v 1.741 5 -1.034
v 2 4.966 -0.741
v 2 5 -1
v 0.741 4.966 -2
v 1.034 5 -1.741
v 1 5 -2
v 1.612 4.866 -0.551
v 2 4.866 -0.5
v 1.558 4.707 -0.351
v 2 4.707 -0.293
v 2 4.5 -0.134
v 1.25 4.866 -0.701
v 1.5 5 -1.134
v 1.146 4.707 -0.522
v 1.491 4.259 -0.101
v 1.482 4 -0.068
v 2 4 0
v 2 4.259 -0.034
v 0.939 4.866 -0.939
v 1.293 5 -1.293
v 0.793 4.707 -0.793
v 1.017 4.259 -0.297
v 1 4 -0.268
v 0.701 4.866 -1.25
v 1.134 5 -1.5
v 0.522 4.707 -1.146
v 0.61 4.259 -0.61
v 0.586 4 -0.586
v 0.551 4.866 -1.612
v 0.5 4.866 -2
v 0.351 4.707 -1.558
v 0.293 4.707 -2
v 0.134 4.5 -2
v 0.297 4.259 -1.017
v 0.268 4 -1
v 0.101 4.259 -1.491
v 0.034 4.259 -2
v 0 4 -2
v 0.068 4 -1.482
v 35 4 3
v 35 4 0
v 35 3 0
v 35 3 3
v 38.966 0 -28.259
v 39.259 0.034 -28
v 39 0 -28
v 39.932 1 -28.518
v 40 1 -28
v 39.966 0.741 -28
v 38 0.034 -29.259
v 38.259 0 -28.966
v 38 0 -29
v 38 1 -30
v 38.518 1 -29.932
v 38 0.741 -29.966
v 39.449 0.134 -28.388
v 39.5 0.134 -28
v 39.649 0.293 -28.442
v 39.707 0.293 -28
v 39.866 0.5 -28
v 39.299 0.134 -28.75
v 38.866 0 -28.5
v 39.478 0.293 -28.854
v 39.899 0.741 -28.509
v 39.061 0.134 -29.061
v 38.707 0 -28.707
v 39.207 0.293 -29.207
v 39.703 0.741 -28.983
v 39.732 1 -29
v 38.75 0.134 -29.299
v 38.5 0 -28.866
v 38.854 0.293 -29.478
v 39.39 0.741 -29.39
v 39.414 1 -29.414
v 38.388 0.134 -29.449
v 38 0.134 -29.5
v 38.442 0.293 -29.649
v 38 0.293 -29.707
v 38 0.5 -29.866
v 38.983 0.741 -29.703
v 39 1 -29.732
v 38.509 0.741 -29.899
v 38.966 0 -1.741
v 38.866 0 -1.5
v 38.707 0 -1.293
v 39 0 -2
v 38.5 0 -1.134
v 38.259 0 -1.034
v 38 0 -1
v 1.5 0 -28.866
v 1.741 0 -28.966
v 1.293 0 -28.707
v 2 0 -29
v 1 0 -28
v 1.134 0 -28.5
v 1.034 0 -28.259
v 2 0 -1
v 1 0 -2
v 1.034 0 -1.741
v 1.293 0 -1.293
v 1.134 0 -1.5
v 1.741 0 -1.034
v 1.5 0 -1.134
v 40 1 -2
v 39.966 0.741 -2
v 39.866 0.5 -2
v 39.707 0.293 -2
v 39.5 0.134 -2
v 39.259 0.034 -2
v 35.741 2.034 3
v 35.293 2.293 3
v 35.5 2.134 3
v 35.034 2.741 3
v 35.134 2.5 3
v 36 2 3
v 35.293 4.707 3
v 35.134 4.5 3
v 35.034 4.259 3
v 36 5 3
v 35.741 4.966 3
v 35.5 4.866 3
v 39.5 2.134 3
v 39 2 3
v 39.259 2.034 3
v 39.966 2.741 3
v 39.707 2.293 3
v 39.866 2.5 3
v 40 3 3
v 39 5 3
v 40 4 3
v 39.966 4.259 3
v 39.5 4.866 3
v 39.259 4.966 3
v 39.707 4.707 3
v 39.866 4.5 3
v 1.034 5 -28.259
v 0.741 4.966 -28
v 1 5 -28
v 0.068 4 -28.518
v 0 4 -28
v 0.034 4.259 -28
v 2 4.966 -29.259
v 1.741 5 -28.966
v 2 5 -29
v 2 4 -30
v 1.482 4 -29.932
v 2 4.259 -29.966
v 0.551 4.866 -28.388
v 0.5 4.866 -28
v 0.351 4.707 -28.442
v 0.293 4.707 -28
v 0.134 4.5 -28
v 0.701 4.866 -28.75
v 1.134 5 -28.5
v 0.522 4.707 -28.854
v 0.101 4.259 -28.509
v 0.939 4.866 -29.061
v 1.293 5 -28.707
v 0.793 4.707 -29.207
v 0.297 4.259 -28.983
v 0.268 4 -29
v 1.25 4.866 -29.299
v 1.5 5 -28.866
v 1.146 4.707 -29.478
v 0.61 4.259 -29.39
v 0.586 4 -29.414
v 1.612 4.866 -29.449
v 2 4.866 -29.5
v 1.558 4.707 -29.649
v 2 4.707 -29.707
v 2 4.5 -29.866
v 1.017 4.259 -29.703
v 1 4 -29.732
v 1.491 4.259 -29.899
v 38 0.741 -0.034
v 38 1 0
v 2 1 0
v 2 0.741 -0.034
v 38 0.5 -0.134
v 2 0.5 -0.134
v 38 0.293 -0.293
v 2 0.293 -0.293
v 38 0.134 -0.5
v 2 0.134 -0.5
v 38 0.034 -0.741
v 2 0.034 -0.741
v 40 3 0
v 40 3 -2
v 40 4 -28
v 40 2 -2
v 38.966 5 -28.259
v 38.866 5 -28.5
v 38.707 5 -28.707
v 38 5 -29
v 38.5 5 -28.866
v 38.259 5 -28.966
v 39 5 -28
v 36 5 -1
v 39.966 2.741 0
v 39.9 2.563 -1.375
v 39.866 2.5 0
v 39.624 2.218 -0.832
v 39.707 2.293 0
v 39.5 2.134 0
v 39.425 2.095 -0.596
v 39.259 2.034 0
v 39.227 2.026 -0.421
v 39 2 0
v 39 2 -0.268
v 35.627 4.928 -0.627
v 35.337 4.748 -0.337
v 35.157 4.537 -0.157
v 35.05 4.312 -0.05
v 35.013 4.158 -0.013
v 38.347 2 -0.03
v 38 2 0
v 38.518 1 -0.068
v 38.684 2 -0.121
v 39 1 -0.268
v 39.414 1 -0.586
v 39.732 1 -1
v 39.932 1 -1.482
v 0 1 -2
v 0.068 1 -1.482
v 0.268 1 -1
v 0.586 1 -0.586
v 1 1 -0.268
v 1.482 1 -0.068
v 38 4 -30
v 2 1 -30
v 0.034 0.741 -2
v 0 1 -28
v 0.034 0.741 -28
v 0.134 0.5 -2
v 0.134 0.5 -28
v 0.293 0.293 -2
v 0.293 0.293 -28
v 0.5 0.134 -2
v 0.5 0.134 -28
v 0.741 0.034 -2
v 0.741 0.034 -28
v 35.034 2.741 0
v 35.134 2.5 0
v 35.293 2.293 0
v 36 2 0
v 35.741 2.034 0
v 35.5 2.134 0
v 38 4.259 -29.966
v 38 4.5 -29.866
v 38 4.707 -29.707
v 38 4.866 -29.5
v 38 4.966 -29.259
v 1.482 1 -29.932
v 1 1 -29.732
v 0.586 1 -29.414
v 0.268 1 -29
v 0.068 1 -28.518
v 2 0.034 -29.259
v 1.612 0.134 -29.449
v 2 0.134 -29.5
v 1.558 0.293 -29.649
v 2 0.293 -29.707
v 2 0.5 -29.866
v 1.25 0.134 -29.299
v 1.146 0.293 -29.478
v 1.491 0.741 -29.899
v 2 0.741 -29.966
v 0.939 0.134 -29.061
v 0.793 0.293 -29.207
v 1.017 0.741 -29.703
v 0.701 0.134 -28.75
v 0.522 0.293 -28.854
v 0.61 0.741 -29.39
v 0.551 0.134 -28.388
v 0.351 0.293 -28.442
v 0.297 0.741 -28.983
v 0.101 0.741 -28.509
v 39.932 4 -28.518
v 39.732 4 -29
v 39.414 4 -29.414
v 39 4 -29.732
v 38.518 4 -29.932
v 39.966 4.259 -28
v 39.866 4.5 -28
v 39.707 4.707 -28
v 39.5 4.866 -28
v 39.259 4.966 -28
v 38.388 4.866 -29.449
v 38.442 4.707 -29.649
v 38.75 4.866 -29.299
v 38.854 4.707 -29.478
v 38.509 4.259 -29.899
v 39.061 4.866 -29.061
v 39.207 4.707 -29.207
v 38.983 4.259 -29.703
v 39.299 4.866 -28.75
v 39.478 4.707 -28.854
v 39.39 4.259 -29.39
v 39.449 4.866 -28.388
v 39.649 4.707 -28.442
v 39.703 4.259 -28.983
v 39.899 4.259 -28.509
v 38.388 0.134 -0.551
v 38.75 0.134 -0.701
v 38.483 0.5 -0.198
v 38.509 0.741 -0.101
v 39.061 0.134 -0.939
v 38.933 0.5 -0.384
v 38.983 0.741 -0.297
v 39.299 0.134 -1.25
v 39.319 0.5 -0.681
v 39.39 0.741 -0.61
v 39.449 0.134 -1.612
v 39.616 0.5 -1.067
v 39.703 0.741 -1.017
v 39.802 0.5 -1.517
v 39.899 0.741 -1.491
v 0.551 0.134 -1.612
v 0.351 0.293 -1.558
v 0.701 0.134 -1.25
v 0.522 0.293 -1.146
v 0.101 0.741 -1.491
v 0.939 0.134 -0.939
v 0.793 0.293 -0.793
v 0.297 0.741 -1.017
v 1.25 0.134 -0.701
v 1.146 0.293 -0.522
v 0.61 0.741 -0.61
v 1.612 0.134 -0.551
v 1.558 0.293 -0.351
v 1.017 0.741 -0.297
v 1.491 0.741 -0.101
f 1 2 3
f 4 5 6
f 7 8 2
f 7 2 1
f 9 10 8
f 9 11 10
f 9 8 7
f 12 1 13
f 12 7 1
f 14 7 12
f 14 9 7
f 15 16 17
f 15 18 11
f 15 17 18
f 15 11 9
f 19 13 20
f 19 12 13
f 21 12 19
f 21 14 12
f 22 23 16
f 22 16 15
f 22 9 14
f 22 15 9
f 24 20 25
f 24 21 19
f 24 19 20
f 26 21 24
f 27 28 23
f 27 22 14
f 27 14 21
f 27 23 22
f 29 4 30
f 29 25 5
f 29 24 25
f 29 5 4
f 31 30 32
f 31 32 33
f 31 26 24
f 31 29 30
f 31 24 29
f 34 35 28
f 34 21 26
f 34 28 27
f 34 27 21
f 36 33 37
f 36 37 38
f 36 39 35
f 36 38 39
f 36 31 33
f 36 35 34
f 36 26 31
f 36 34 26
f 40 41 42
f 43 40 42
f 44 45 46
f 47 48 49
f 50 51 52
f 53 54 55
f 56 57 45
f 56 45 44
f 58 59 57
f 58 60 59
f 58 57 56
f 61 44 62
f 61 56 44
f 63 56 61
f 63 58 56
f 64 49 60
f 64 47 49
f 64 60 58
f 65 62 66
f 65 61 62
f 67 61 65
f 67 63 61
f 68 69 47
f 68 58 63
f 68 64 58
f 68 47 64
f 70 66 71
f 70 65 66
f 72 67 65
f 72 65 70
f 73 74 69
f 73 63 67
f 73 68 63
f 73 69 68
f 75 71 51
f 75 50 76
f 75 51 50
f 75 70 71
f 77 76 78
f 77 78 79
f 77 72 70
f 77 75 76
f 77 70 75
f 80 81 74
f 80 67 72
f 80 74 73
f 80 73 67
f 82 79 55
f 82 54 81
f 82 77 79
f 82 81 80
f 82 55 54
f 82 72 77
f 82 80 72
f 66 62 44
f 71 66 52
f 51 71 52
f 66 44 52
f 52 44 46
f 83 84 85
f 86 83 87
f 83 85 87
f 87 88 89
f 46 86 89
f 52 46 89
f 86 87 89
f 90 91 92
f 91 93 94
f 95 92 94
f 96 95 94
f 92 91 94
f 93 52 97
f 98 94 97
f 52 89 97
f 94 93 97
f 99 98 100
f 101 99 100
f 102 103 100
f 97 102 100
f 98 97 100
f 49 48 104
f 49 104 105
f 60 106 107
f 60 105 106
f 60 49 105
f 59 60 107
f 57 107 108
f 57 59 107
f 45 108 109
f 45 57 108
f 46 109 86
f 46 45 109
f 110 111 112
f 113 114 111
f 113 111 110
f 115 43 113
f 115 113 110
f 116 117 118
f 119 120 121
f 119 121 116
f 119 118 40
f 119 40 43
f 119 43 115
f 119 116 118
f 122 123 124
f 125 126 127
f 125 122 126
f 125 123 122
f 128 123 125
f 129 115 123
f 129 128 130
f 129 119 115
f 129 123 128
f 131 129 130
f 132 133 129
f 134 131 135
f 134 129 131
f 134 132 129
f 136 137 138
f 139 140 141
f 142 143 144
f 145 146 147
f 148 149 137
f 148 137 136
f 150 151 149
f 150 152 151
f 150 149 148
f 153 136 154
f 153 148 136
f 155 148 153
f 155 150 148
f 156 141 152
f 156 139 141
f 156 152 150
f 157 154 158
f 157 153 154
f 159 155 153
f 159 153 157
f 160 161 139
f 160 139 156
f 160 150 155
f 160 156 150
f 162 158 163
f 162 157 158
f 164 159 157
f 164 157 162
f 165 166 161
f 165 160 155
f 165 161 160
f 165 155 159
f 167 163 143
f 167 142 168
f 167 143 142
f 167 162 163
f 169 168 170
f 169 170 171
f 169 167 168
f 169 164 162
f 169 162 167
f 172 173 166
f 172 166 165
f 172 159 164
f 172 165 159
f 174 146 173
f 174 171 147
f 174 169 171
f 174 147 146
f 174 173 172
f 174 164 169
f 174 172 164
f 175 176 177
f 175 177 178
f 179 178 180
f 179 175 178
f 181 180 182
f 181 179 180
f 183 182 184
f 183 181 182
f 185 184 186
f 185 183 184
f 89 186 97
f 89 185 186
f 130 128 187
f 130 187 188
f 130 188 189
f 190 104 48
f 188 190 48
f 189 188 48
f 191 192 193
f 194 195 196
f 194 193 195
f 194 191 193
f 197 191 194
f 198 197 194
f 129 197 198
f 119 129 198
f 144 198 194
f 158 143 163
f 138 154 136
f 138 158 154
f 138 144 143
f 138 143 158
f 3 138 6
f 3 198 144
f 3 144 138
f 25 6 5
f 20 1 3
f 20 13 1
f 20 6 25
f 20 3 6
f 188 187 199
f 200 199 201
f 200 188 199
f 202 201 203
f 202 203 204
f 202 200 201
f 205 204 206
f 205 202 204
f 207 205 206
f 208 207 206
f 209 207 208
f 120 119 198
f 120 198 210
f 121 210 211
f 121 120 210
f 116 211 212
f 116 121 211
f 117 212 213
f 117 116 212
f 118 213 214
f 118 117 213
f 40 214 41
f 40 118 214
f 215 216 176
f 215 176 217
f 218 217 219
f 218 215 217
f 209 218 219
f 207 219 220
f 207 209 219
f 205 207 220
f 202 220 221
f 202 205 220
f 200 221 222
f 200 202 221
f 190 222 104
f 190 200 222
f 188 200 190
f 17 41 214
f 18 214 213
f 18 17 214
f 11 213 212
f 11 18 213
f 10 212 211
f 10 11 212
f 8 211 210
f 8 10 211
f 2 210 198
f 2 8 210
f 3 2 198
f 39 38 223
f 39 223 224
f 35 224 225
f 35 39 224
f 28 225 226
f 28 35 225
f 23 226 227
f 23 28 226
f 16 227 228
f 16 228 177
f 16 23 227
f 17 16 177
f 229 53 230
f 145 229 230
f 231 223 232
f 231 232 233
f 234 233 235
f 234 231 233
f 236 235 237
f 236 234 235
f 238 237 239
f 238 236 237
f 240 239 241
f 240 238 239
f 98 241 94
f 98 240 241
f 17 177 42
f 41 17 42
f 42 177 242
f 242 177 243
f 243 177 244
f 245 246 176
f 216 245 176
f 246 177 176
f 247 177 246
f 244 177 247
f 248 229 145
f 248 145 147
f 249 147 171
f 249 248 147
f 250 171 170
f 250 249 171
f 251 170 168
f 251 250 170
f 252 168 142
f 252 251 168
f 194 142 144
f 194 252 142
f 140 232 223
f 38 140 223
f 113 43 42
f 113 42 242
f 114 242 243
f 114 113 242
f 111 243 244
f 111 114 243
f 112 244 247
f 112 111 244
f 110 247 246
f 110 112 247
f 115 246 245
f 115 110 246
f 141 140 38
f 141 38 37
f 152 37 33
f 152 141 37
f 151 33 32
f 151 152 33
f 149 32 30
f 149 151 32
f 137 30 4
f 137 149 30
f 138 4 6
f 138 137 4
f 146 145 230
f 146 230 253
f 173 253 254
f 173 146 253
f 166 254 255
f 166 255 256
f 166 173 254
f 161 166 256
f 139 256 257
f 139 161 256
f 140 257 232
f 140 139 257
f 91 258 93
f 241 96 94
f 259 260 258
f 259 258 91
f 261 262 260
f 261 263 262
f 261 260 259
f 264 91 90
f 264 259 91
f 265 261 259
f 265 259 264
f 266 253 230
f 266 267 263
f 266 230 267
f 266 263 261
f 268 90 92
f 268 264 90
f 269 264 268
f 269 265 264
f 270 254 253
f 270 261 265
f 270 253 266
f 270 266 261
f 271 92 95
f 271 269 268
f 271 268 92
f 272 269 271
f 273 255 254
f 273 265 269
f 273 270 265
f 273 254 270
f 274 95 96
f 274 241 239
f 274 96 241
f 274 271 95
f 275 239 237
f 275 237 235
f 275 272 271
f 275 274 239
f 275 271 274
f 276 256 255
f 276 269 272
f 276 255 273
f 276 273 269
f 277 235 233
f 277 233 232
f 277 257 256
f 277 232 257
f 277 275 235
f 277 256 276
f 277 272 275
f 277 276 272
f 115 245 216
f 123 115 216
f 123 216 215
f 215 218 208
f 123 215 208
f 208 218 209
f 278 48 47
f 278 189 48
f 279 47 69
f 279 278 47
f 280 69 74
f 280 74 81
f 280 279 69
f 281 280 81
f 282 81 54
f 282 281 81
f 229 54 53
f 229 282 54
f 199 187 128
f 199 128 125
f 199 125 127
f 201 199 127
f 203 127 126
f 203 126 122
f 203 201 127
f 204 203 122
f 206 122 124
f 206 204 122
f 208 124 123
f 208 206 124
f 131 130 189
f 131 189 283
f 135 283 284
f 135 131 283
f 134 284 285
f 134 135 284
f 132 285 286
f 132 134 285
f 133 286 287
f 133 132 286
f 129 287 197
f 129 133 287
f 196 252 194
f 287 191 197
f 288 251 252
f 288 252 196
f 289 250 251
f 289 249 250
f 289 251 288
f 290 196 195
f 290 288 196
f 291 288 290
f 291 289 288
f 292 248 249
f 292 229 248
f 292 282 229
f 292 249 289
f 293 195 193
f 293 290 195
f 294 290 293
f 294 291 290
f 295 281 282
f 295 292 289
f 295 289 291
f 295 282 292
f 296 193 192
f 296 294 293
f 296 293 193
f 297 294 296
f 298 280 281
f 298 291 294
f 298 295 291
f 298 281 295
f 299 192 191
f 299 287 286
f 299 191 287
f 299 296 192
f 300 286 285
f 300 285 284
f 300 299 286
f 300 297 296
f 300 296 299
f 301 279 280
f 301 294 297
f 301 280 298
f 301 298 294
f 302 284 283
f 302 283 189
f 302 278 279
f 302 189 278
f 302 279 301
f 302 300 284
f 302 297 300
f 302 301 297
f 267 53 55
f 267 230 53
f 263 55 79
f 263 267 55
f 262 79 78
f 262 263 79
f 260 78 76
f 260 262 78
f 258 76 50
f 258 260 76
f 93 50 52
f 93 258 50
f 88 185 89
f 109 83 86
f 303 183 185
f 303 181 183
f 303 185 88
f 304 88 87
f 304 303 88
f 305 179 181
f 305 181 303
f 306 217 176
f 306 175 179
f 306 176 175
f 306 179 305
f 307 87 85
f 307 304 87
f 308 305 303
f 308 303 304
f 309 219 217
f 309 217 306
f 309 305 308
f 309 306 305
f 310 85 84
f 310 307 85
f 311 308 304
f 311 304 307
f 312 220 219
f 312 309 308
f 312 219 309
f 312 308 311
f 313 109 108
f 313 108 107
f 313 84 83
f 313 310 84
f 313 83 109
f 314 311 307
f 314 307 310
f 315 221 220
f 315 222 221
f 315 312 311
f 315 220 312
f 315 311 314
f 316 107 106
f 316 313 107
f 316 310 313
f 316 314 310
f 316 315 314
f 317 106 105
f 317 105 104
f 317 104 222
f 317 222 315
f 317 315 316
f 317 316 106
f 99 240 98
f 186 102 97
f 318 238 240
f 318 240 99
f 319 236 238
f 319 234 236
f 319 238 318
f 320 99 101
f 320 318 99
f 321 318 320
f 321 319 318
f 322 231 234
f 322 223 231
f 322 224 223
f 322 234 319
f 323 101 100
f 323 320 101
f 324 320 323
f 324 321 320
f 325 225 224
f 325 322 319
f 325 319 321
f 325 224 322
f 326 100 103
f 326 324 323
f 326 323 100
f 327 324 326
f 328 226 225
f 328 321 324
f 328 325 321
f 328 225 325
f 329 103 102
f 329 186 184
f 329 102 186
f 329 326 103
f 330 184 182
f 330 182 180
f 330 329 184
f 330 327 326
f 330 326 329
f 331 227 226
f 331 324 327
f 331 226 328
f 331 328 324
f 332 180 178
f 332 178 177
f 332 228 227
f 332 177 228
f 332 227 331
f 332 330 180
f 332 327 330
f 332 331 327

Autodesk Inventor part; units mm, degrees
ref_plane "YZ Plane" through (0, 0, 0) normal (1, 0, 0) x (0, 1, 0)
ref_plane "XZ Plane" through (0, 0, 0) normal (0, 1, 0) x (-1, 0, 0)
ref_plane "XY Plane" through (0, 0, 0) normal (0, 0, 1) x (1, 0, 0)
sketch "Sketch1" plane through (0, 0, 0) normal (0, 1, 0) x (-1, 0, 0)
  line L0 (0, 0) -> (-40, 0)
  line L1 (-40, 0) -> (-40, -30)
  line L2 (-40, -30) -> (0, -30)
  line L3 (0, -30) -> (0, 0)
  dimension "d0" = 40
  dimension "d1" = 30
extrude "Extrusion1" add sketch "Sketch1" along normal blind 5
sketch "Sketch2" plane through (0, 0, 0) normal (0, 0, 1) x (1, 0, 0)
  line L0 (0, 0) -> (40, 0) construction
  line L1 (40, 0) -> (40, 5) construction
  line L2 (0, 5) -> (40, 5) construction
  line L3 (0, 0) -> (0, 5) construction
  line L4 (40, 0) -> (40, 5) projected
  line L5 (40, 5) -> (35, 5)
  line L6 (35, 5) -> (35, 2)
  line L7 (35, 2) -> (40, 2)
  line L8 (40, 2) -> (40, 5)
  dimension "d4" = 3
  dimension "d5" = 5
extrude "Extrusion2" add sketch "Sketch2" along normal blind 3
fillet "Fillet1" radius 2 4 edges at (0, 2.5, 0) (0, 2.5, -30) (40, 2.5, -30) (40, 1, 0)
fillet "Fillet2" radius 1 18 edges at (35, 5, 1.5) (35, 2, 1.5) (40, 2, -1) (39.4142, 5, -29.4142) (20, 5, -30) (0.5858, 5, -29.4142) (0, 5, -15) (0.5858, 5, -0.5858) (18.5, 5, 0) (40, 5, -12.5) (40, 0, -15) (39.4142, 0, -29.4142) (20, 0, -30) (0.5858, 0, -29.4142) (0, 0, -15) (0.5858, 0, -0.5858) (20, 0, 0) (39.4142, 0, -0.5858)
properties part number "BATTERY_1S_560MAH_AKYGA"
